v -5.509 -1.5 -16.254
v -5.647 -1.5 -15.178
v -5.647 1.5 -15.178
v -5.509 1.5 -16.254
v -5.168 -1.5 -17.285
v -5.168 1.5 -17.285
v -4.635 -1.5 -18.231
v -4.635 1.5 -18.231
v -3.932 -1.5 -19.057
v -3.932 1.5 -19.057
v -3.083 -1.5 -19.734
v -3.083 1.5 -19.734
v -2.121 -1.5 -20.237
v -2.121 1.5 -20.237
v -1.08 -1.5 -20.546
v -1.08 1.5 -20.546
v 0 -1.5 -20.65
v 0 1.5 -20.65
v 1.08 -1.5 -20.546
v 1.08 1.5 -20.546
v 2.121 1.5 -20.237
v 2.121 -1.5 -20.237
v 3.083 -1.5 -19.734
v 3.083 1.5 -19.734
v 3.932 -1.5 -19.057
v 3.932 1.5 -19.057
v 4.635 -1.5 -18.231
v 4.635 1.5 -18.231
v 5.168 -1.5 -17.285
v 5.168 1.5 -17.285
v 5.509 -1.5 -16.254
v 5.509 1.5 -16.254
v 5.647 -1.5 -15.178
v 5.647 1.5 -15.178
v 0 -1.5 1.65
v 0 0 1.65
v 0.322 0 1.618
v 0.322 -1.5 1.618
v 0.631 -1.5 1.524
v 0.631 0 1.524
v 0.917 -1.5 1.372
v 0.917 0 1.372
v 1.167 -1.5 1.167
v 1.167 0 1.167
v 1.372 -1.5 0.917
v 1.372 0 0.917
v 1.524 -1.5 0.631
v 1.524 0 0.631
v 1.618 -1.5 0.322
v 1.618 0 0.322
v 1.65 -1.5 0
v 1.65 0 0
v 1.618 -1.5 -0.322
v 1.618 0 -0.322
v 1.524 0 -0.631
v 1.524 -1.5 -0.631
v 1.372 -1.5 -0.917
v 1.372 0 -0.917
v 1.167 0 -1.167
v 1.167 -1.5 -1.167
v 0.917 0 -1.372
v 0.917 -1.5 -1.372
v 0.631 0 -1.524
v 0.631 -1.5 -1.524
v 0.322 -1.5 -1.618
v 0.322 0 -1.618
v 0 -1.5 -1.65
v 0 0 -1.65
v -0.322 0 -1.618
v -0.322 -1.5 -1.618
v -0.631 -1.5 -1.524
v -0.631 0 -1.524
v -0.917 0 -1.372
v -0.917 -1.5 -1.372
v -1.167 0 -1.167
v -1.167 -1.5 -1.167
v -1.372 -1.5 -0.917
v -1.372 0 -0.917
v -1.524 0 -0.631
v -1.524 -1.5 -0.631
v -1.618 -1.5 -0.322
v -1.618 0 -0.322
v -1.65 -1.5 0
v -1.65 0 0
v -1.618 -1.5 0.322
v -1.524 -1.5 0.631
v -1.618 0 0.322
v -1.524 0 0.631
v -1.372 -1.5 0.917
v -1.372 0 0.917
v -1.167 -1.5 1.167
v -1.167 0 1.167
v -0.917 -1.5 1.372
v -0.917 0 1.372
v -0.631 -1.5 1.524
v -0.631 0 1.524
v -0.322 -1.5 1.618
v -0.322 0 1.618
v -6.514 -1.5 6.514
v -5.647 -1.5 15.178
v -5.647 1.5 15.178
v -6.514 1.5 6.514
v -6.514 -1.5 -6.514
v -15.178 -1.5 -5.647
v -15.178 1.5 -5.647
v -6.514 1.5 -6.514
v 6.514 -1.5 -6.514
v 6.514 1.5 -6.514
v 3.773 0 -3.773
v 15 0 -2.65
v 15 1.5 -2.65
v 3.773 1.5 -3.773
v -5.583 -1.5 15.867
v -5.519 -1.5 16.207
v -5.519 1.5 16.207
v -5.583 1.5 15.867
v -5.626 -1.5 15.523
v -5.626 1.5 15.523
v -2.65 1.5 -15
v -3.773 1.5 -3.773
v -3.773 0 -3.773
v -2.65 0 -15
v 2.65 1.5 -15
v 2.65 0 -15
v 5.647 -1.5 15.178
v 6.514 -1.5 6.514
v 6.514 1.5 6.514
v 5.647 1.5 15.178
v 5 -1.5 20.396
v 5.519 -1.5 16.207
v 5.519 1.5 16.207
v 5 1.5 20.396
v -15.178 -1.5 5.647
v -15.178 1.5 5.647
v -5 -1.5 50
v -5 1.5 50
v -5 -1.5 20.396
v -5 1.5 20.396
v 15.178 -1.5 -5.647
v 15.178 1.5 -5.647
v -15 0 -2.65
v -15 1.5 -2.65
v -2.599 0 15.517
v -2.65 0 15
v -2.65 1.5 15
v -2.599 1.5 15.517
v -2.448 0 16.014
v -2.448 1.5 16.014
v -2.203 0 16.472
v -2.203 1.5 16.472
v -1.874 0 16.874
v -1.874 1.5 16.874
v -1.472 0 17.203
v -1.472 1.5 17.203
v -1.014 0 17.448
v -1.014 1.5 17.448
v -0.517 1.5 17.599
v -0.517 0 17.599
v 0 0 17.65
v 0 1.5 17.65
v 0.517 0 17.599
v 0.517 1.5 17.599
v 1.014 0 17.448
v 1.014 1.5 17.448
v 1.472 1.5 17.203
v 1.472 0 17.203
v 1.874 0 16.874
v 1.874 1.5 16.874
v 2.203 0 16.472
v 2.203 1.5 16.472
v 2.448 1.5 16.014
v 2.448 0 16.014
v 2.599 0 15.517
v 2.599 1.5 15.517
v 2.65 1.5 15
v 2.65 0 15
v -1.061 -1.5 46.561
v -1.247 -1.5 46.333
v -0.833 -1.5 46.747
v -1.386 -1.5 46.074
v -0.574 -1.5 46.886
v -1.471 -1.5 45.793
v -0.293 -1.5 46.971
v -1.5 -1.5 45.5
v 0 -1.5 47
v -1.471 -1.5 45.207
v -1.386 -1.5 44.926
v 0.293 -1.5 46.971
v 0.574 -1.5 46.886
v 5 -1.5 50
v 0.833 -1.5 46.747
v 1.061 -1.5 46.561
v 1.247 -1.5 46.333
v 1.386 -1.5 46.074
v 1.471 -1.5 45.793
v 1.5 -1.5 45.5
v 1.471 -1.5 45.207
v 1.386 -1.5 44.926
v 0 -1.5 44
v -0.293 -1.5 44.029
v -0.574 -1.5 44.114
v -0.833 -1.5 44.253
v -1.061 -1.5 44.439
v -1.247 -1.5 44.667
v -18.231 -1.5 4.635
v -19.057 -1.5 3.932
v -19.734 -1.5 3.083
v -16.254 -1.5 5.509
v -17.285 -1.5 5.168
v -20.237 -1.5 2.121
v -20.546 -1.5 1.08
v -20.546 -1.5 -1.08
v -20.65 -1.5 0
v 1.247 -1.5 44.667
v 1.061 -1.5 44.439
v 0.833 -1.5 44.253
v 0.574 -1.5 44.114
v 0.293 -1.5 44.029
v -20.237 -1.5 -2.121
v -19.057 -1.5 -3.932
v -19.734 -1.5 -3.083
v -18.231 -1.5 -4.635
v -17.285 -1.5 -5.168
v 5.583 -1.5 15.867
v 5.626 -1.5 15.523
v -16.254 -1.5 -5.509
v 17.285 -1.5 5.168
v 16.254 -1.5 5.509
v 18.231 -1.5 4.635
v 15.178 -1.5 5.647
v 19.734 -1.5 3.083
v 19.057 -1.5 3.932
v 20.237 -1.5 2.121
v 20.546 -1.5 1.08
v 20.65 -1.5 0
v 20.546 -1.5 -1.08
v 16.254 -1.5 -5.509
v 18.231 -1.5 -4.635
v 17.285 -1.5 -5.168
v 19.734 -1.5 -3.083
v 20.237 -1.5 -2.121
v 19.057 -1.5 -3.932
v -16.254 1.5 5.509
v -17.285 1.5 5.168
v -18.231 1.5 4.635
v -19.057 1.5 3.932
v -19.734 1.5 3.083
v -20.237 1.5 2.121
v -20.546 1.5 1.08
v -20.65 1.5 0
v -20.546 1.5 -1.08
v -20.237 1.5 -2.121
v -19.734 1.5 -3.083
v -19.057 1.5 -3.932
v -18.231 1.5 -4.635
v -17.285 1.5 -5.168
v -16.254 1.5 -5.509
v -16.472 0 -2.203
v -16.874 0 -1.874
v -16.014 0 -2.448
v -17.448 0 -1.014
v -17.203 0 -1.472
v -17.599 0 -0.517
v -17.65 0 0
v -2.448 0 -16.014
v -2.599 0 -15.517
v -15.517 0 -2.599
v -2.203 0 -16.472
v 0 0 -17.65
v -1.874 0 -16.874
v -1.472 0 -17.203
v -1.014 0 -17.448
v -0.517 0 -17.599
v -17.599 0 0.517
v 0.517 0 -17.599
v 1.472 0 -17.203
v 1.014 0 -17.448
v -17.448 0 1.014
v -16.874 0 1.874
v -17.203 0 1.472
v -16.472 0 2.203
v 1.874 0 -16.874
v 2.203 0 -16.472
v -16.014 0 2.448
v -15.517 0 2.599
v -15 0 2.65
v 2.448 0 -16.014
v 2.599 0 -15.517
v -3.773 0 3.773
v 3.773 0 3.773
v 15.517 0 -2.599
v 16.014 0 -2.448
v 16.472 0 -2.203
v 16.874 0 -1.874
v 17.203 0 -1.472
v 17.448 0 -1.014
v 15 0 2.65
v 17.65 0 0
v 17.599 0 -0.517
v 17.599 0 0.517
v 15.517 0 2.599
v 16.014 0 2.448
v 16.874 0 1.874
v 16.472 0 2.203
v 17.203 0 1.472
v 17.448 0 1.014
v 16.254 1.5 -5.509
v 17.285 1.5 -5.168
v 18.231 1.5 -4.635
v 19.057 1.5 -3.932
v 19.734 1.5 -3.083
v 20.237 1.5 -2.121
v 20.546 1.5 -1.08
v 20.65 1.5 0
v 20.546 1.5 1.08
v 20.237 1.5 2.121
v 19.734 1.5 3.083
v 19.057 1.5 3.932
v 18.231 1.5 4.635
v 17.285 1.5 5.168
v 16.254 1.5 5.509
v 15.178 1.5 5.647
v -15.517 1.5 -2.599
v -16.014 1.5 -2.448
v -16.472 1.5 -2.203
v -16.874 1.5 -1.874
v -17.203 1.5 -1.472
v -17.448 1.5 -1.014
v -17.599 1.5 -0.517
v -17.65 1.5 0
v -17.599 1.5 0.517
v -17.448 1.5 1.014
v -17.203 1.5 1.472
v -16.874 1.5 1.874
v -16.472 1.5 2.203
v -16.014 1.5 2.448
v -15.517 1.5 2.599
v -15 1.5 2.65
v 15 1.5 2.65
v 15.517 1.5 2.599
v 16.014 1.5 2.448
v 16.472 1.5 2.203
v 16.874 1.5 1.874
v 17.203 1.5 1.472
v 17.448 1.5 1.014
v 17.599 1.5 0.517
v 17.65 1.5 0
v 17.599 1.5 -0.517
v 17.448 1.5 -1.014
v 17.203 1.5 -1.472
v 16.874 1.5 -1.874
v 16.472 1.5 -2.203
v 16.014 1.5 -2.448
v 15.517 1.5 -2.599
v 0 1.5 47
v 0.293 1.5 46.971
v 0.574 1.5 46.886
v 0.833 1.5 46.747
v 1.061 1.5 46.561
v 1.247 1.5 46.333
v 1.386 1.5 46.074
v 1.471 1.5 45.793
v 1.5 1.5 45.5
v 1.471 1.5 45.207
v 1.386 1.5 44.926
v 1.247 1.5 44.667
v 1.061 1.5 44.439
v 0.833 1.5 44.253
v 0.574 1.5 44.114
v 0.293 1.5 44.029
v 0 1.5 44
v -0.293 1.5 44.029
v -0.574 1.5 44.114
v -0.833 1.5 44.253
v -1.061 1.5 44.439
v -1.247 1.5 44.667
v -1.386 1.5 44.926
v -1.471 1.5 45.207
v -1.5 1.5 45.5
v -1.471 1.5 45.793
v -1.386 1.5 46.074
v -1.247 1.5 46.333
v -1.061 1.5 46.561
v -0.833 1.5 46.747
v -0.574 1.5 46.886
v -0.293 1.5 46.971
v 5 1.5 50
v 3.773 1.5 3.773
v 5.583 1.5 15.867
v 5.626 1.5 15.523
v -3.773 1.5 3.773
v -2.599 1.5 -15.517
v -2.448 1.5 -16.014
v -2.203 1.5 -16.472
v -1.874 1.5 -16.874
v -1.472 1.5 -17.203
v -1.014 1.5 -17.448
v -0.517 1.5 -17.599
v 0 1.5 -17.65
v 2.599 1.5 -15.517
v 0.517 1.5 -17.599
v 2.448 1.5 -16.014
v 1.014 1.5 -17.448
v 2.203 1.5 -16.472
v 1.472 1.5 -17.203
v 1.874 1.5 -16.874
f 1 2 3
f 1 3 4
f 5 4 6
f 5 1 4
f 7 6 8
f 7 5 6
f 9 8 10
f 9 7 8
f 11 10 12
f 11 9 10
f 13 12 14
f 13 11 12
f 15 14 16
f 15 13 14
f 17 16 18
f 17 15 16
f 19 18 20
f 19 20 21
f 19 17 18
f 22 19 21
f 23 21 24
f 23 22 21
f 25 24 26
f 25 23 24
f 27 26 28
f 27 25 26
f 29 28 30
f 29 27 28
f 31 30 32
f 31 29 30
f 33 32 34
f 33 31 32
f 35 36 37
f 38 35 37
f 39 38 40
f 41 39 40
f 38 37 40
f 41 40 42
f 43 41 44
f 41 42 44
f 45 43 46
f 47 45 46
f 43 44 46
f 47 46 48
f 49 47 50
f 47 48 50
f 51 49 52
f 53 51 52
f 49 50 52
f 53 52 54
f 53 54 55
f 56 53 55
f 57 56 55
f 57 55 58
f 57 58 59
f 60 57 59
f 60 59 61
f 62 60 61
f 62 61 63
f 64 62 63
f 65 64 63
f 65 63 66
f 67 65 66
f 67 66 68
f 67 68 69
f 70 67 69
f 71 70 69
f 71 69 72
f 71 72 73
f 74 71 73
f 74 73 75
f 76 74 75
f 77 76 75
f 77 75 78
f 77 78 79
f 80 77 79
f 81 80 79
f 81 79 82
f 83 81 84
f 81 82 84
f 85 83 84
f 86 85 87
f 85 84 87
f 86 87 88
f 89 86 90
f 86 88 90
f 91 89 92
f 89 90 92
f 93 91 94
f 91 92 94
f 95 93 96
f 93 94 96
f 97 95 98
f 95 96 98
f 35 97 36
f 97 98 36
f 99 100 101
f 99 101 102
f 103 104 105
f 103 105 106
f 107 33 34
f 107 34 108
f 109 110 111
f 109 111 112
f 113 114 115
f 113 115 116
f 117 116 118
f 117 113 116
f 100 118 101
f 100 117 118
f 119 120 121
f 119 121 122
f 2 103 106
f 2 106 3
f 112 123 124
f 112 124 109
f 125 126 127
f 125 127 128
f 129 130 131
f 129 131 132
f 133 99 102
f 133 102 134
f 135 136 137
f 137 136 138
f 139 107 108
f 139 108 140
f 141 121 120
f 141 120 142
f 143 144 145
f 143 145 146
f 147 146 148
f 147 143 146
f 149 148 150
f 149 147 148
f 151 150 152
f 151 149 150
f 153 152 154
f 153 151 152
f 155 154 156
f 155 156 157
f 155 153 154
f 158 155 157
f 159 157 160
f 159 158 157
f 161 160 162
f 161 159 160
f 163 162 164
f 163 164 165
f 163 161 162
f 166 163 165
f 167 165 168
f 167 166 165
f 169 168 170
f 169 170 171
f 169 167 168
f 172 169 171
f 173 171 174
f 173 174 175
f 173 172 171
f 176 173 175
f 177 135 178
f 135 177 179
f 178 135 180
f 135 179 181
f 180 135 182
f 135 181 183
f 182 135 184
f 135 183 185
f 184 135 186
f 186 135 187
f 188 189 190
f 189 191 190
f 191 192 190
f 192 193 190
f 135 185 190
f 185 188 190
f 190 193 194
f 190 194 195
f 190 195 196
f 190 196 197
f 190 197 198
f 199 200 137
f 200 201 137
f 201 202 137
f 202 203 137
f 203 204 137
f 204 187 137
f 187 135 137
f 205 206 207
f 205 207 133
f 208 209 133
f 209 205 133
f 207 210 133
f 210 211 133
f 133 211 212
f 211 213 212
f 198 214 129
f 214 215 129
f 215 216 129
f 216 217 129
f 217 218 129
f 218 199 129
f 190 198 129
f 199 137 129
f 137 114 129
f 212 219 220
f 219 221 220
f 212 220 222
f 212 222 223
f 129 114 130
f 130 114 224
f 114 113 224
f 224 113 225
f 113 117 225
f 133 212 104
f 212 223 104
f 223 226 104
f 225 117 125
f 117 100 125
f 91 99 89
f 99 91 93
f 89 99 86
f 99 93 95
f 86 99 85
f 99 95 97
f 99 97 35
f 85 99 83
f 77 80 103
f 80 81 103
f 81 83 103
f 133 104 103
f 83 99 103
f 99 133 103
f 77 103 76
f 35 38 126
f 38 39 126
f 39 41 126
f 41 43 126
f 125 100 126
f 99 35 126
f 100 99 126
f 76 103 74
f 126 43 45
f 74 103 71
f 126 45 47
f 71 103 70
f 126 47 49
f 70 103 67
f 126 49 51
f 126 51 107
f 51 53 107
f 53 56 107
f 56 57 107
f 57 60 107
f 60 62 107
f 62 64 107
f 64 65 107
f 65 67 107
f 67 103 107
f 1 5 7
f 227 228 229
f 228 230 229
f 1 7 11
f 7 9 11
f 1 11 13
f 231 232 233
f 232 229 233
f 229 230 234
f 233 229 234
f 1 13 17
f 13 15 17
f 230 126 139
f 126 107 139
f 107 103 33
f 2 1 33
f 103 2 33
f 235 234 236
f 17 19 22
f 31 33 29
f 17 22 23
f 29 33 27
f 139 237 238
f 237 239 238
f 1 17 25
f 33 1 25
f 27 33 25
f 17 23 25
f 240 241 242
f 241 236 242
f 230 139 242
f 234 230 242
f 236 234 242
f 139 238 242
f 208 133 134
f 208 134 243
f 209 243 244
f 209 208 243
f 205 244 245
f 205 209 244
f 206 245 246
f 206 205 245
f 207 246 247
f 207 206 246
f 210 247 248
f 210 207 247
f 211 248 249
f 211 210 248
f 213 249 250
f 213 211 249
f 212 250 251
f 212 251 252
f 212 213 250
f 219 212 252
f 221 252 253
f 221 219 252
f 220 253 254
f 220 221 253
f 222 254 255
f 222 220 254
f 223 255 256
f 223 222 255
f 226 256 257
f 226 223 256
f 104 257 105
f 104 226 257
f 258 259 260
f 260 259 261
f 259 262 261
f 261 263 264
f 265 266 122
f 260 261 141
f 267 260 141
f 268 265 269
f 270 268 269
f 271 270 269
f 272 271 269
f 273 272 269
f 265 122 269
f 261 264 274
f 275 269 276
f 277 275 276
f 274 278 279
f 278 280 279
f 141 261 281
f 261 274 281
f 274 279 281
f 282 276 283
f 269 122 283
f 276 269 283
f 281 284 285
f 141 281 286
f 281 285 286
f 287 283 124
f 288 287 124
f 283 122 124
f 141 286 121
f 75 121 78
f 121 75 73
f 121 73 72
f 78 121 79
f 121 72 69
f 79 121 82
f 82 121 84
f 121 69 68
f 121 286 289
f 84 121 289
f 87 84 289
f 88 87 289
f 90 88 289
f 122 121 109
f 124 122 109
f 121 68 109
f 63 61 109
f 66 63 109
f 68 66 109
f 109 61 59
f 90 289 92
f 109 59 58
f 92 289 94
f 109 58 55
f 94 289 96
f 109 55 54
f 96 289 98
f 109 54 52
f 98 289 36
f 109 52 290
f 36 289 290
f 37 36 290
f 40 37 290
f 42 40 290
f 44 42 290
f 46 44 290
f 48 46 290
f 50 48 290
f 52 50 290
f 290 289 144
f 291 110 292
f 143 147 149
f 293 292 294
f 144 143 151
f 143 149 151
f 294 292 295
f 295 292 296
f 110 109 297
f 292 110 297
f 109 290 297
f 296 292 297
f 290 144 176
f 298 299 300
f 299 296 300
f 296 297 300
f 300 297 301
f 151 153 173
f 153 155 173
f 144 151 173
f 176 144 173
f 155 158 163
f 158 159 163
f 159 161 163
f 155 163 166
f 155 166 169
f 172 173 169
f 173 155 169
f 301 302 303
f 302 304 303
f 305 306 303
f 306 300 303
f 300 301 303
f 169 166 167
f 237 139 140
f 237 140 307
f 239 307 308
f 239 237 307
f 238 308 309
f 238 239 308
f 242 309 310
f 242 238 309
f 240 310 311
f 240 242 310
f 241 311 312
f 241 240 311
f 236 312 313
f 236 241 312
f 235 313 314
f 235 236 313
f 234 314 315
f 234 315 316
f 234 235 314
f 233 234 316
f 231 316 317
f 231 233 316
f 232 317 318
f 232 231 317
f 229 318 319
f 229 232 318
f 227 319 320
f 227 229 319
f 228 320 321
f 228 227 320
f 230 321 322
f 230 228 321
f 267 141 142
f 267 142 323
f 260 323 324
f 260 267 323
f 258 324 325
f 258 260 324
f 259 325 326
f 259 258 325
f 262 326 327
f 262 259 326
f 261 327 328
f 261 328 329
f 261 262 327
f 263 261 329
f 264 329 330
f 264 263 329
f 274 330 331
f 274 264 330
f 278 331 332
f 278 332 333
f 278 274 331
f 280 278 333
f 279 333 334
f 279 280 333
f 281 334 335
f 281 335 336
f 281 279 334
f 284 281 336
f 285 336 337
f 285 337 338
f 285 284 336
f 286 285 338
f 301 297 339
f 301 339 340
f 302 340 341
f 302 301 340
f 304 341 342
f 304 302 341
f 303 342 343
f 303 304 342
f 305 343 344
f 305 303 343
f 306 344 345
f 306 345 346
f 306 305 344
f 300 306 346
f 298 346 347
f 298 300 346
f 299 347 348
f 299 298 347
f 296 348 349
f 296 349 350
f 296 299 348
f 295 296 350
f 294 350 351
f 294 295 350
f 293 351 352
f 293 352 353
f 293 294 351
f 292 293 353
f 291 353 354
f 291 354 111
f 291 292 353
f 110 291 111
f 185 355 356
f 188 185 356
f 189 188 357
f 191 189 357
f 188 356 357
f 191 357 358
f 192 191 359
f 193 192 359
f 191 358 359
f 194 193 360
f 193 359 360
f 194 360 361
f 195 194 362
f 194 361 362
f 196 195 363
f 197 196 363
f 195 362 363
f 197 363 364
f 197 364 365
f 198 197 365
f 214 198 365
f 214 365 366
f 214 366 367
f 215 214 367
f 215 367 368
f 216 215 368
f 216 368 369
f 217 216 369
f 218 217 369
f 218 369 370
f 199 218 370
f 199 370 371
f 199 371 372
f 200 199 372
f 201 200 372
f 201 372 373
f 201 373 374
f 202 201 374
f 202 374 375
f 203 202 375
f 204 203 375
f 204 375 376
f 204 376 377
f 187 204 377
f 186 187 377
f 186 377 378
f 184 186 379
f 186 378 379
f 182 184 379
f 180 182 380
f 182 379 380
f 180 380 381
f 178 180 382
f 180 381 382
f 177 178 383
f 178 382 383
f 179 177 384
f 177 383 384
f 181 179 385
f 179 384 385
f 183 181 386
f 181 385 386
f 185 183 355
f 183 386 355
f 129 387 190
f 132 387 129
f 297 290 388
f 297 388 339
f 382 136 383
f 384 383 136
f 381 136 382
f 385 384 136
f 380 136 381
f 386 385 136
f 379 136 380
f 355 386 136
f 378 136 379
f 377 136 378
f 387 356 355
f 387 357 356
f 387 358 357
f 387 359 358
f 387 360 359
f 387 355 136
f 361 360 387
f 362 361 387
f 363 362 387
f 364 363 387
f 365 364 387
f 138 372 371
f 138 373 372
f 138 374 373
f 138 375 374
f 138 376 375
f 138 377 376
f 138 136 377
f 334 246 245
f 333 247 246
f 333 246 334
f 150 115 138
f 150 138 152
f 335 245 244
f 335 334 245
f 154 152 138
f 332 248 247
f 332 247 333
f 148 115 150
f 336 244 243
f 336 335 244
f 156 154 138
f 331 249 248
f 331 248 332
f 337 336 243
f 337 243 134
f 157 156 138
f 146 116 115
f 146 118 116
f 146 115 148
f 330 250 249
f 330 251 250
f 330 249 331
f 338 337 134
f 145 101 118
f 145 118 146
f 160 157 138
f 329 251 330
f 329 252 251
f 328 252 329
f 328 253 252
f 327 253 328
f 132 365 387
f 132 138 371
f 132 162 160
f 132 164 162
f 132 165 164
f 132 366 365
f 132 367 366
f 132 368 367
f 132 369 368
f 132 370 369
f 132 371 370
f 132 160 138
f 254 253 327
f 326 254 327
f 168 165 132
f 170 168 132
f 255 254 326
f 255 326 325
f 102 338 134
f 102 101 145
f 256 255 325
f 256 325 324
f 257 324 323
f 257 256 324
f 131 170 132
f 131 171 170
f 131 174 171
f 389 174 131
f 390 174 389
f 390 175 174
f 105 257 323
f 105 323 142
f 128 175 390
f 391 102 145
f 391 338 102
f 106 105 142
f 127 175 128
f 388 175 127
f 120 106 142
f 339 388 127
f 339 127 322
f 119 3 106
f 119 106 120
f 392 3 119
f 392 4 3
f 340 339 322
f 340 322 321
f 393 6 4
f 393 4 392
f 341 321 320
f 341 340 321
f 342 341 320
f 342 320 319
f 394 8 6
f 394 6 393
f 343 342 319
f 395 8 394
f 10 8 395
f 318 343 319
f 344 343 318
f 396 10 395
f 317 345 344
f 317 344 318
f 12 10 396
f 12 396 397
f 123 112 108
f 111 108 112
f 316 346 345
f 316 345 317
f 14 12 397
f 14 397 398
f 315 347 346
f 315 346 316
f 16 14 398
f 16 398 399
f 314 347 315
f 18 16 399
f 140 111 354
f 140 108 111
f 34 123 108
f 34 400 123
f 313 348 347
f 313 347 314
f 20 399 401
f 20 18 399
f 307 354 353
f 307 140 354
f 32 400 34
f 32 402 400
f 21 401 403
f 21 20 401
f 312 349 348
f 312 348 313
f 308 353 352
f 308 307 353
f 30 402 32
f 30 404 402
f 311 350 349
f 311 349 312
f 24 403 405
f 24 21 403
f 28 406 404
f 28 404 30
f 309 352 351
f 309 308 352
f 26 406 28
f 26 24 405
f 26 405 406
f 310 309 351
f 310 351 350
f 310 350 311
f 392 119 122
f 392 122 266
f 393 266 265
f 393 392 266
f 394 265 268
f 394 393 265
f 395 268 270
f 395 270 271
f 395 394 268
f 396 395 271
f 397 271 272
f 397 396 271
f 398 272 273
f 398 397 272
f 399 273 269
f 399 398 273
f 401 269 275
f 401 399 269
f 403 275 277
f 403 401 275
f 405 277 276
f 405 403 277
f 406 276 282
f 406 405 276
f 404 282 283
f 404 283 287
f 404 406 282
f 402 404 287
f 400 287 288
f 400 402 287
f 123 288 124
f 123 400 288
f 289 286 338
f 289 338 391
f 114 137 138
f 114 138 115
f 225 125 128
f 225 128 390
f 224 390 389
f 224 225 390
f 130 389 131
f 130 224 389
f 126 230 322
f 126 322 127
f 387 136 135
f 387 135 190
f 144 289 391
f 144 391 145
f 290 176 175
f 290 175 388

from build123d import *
from build123d.topology import SkipClean

# Parameters (mm, degrees)
SKETCH1_R               = 21
BOSS_EXTRUDE1_DEPTH     = 1.5
SKETCH2_R               = 2.65
CUT_EXTRUDE1_DEPTH      = 1.5
SKETCH5_W               = 10
SKETCH5_H               = 50
BOSS_EXTRUDE2_DEPTH     = 1.5
CIRPATTERN1_DEPTH       = 1.5
CUT_EXTRUDE4_REACH      = 56.252
SKETCH4_R               = 1.65
CUT_EXTRUDE5_REACH      = 56.314
SKETCH6_R               = 1.5
CUT_EXTRUDE6_DEPTH      = 55.251728083
CUT_EXTRUDE6_DEPTH_BACK = 55.251728083


# Read off the part's stored shape, not the designer's step: CirPattern1
with BuildPart() as part:
    # Sketch1 → Boss-Extrude1 (new, symmetric)
    with BuildSketch(Plane(origin=(0, 0, 0), x_dir=(1, 0, 0), z_dir=(0, 1, 0))):
        with Locations(Location((0, 0, 0), (0, 0, 270))):
            Circle(SKETCH1_R)
    extrude(amount=BOSS_EXTRUDE1_DEPTH, both=True)

    # Sketch2 → Cut-Extrude1 (cut)
    with BuildSketch(Plane(origin=(0, 1.5, 0), x_dir=(1, 0, 0), z_dir=(0, 1, 0))):
        with Locations((0, -15)):
            Circle(SKETCH2_R)
        with BuildLine():
            ThreePointArc((-2.65, -15), (0, -12.35), (2.65, -15))
            Line((2.65, -15), (4.067821782, -0.821782178))
            ThreePointArc((4.067821782, -0.821782178), (0, -4.15), (-4.067821782, -0.821782178))
            Line((-4.067821782, -0.821782178), (-2.65, -15))
        make_face()
        with BuildLine():
            ThreePointArc((-4.067821782, -0.821782178), (0, -4.15), (4.067821782, -0.821782178))
            Line((4.067821782, -0.821782178), (4.15, 0))
            ThreePointArc((4.15, 0), (0, 4.15), (-4.15, 0))
            Line((-4.15, 0), (-4.067821782, -0.821782178))
        make_face()
    cut_extrude1 = extrude(amount=-CUT_EXTRUDE1_DEPTH, mode=Mode.SUBTRACT)

    # Sketch5 → Boss-Extrude2 (add, symmetric)
    with BuildSketch(Plane(origin=(0, 0, 0), x_dir=(1, 0, 0), z_dir=(0, 1, 0))):
        with Locations((0, -25)):
            Rectangle(SKETCH5_W, SKETCH5_H)
    extrude(amount=BOSS_EXTRUDE2_DEPTH, both=True)

    # Mirror1: Cut-Extrude1 across plane
    with SkipClean():  # the faces are left unmerged after this step: merging them gives an invalid solid
        add(cut_extrude1.mirror(Plane.XY), mode=Mode.SUBTRACT)

    # CirPattern1 outline → CirPattern1 (cut)
    with BuildSketch(Plane(origin=(0, 0, 0), x_dir=(1, 0, 0), z_dir=(0, 1, 0))):
        with BuildLine():
            Line((3.772727273, -3.772727273), (15, -2.65))
            ThreePointArc((15, -2.65), (17.65, 0), (15, 2.65))
            Line((15, 2.65), (3.772727273, 3.772727273))
            Line((3.772727273, 3.772727273), (4.067821782, 0.821782178))
            ThreePointArc((4.067821782, 0.821782178), (0, -4.15), (-4.067821782, 0.821782178))
            Line((-4.067821782, 0.821782178), (-3.772727273, 3.772727273))
            Line((-3.772727273, 3.772727273), (-15, 2.65))
            ThreePointArc((-15, 2.65), (-17.65, 0), (-15, -2.65))
            Line((-15, -2.65), (-3.772727273, -3.772727273))
            Line((-3.772727273, -3.772727273), (-2.65, -15))
            ThreePointArc((-2.65, -15), (0, -17.65), (2.65, -15))
            Line((2.65, -15), (3.772727273, -3.772727273))
        make_face()
    extrude(amount=CIRPATTERN1_DEPTH, mode=Mode.SUBTRACT)

    # Sketch4 → Cut-Extrude4 (cut, up to next)
    with BuildSketch(Plane(origin=(0, 0, 0), x_dir=(1, 0, 0), z_dir=(0, 1, 0)), mode=Mode.PRIVATE) as cut_extrude4_sk1:
        with Locations(Location((0, 0, 0), (0, 0, 270))):
            Circle(SKETCH4_R)
    cut_extrude4_tool1 = extrude(cut_extrude4_sk1.sketch, amount=-CUT_EXTRUDE4_REACH, mode=Mode.PRIVATE) & part.part
    add(cut_extrude4_tool1.solids().sort_by_distance((0, 0, 0))[0], mode=Mode.SUBTRACT)

    # Sketch6 → Cut-Extrude5 (cut, up to next)
    with BuildSketch(Plane(origin=(0, 1.5, 0), x_dir=(1, 0, 0), z_dir=(0, 1, 0)), mode=Mode.PRIVATE) as cut_extrude5_sk1:
        with Locations(Location((0, -45.5, 0), (0, 0, 270))):
            Circle(SKETCH6_R)
    cut_extrude5_tool1 = extrude(cut_extrude5_sk1.sketch, amount=-CUT_EXTRUDE5_REACH, mode=Mode.PRIVATE) & part.part
    add(cut_extrude5_tool1.solids().sort_by_distance((0, 1.5, 45.5))[0], mode=Mode.SUBTRACT)

    # Sketch7 → Cut-Extrude6 (cut, two sides: drawn at the far end of the back side and taken through both)
    with BuildSketch(Plane(origin=(0, 0, 0), x_dir=(1, 0, 0), z_dir=(0, 1, 0)).offset(-CUT_EXTRUDE6_DEPTH_BACK)):
        with BuildLine():
            ThreePointArc((5, -20.396078054), (0, 21), (-5, -20.396078054))
            Line((-5, -20.396078054), (-5.519486194, -16.207382355))
            ThreePointArc((-5.519486194, -16.207382355), (-5.607043009, -15.695391034), (-5.647210443, -15.177522436))
            Line((-5.647210443, -15.177522436), (-6.513602442, -6.513602442))
            Line((-6.513602442, -6.513602442), (-15.177522436, -5.647210443))
            ThreePointArc((-15.177522436, -5.647210443), (-20.65, 0), (-15.177522436, 5.647210443))
            Line((-15.177522436, 5.647210443), (-6.513602442, 6.513602442))
            Line((-6.513602442, 6.513602442), (-5.647210443, 15.177522436))
            ThreePointArc((-5.647210443, 15.177522436), (0, 20.65), (5.647210443, 15.177522436))
            Line((5.647210443, 15.177522436), (6.513602442, 6.513602442))
            Line((6.513602442, 6.513602442), (15.177522436, 5.647210443))
            ThreePointArc((15.177522436, 5.647210443), (20.65, 0), (15.177522436, -5.647210443))
            Line((15.177522436, -5.647210443), (6.513602442, -6.513602442))
            Line((6.513602442, -6.513602442), (5.647210443, -15.177522436))
            ThreePointArc((5.647210443, -15.177522436), (5.607043009, -15.695391034), (5.519486194, -16.207382355))
            Line((5.519486194, -16.207382355), (5, -20.396078054))
        make_face()
    extrude(amount=CUT_EXTRUDE6_DEPTH + CUT_EXTRUDE6_DEPTH_BACK, mode=Mode.SUBTRACT)


solid = part.part
